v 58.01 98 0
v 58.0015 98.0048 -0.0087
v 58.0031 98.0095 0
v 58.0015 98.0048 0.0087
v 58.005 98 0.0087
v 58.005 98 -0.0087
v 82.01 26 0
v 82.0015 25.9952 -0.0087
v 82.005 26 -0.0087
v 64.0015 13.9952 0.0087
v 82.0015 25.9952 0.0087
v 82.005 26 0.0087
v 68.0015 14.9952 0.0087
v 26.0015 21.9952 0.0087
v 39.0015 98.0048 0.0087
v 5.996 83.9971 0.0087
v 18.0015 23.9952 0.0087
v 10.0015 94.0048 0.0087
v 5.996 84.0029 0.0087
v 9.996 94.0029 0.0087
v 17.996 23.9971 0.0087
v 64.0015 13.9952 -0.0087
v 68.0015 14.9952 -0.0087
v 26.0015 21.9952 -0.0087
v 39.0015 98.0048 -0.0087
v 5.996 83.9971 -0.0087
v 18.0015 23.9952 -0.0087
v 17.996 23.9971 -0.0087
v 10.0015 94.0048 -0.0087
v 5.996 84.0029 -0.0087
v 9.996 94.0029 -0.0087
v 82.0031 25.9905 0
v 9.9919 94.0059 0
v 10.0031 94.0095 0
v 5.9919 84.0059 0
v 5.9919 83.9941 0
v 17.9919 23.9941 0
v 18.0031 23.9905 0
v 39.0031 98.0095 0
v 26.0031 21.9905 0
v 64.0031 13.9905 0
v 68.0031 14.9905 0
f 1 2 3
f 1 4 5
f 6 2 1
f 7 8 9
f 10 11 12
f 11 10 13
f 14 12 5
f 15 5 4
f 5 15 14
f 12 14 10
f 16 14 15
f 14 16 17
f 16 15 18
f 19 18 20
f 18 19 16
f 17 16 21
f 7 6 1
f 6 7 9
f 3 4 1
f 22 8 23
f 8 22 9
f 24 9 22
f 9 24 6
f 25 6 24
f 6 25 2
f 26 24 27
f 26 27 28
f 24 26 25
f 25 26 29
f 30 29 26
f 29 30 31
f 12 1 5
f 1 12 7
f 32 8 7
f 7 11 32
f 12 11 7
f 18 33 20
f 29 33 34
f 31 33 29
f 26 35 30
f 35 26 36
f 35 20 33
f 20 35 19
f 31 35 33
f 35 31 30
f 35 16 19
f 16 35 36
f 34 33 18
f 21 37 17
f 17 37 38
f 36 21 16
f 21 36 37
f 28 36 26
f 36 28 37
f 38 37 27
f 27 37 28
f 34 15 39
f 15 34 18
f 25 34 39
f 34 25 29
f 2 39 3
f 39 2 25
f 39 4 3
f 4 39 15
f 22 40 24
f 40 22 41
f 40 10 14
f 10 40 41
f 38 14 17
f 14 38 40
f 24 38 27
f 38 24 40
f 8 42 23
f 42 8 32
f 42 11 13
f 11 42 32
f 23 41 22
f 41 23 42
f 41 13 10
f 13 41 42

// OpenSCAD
color([0.3519350680925015,0.6477014615427978,0.14125726454845833]) hull(){
    translate([58,98]) sphere(0.01);
    translate([44,55]) sphere(0.01);
    translate([82,26]) sphere(0.01);
}
color([0.23013900541024712,0.8285218163248013,0.9603761550286747]) hull(){
    translate([22,90]) sphere(0.01);
    translate([10,94]) sphere(0.01);
    translate([6,84]) sphere(0.01);
}
color([0.6050710034948523,0.017553655236826726,0.43262871278032167]) hull(){
    translate([18,24]) sphere(0.01);
    translate([18,58]) sphere(0.01);
    translate([6,84]) sphere(0.01);
}
color([0.2571490251669072,0.4480229944680496,0.14517873337393172]) hull(){
    translate([18,58]) sphere(0.01);
    translate([22,90]) sphere(0.01);
    translate([6,84]) sphere(0.01);
}
color([0.8405131005933094,0.9776834869331054,0.10300019528175153]) hull(){
    translate([22,90]) sphere(0.01);
    translate([18,58]) sphere(0.01);
    translate([44,55]) sphere(0.01);
}
color([0.998153073210626,0.8535026464000083,0.6855970549077809]) hull(){
    translate([50,93]) sphere(0.01);
    translate([44,55]) sphere(0.01);
    translate([58,98]) sphere(0.01);
}
color([0.7995005100691247,0.34047238184459006,0.1286635278612125]) hull(){
    translate([50,93]) sphere(0.01);
    translate([22,90]) sphere(0.01);
    translate([44,55]) sphere(0.01);
}
color([0.6020598448119898,0.9167847797194366,0.02081986636819022]) hull(){
    translate([22,90]) sphere(0.01);
    translate([39,98]) sphere(0.01);
    translate([10,94]) sphere(0.01);
}
color([0.9135118305629362,0.3823609034395232,0.42581309278619206]) hull(){
    translate([39,98]) sphere(0.01);
    translate([50,93]) sphere(0.01);
    translate([58,98]) sphere(0.01);
}
color([0.08967296065919184,0.0016857337534631478,0.31287848776698257]) hull(){
    translate([50,93]) sphere(0.01);
    translate([39,98]) sphere(0.01);
    translate([22,90]) sphere(0.01);
}
color([0.09731792302828757,0.364404074066101,0.8754307508322564]) hull(){
    translate([44,55]) sphere(0.01);
    translate([58,33]) sphere(0.01);
    translate([82,26]) sphere(0.01);
}
color([0.6967090939923642,0.5776053806129825,0.18685318159950626]) hull(){
    translate([64,14]) sphere(0.01);
    translate([58,33]) sphere(0.01);
    translate([42,29]) sphere(0.01);
}
color([0.9585806736472646,0.593334846568766,0.09927504601217696]) hull(){
    translate([44,47]) sphere(0.01);
    translate([18,58]) sphere(0.01);
    translate([18,24]) sphere(0.01);
}
color([0.19313665173925,0.6863688301261038,0.2093263356404984]) hull(){
    translate([18,58]) sphere(0.01);
    translate([44,47]) sphere(0.01);
    translate([44,55]) sphere(0.01);
}
color([0.2694340379225941,0.24598969558588324,0.16092298384524362]) hull(){
    translate([44,47]) sphere(0.01);
    translate([58,33]) sphere(0.01);
    translate([44,55]) sphere(0.01);
}
color([0.5102606956149307,0.431705445139412,0.38909399282504675]) hull(){
    translate([58,33]) sphere(0.01);
    translate([44,47]) sphere(0.01);
    translate([42,29]) sphere(0.01);
}
color([0.3194819673674283,0.6655357355223767,0.22692357675811492]) hull(){
    translate([26,22]) sphere(0.01);
    translate([64,14]) sphere(0.01);
    translate([42,29]) sphere(0.01);
}
color([0.9464906820257937,0.35776616524050997,0.9421064453260054]) hull(){
    translate([26,22]) sphere(0.01);
    translate([44,47]) sphere(0.01);
    translate([18,24]) sphere(0.01);
}
color([0.3792404853118415,0.27508202782836655,0.9368074710650367]) hull(){
    translate([44,47]) sphere(0.01);
    translate([26,22]) sphere(0.01);
    translate([42,29]) sphere(0.01);
}
color([0.7670397757471089,0.17483880300164423,0.7474114244696689]) hull(){
    translate([58,33]) sphere(0.01);
    translate([68,15]) sphere(0.01);
    translate([82,26]) sphere(0.01);
}
color([0.6015236368594579,0.5872808850844162,0.28390336255679416]) hull(){
    translate([64,14]) sphere(0.01);
    translate([68,15]) sphere(0.01);
    translate([58,33]) sphere(0.01);
}
